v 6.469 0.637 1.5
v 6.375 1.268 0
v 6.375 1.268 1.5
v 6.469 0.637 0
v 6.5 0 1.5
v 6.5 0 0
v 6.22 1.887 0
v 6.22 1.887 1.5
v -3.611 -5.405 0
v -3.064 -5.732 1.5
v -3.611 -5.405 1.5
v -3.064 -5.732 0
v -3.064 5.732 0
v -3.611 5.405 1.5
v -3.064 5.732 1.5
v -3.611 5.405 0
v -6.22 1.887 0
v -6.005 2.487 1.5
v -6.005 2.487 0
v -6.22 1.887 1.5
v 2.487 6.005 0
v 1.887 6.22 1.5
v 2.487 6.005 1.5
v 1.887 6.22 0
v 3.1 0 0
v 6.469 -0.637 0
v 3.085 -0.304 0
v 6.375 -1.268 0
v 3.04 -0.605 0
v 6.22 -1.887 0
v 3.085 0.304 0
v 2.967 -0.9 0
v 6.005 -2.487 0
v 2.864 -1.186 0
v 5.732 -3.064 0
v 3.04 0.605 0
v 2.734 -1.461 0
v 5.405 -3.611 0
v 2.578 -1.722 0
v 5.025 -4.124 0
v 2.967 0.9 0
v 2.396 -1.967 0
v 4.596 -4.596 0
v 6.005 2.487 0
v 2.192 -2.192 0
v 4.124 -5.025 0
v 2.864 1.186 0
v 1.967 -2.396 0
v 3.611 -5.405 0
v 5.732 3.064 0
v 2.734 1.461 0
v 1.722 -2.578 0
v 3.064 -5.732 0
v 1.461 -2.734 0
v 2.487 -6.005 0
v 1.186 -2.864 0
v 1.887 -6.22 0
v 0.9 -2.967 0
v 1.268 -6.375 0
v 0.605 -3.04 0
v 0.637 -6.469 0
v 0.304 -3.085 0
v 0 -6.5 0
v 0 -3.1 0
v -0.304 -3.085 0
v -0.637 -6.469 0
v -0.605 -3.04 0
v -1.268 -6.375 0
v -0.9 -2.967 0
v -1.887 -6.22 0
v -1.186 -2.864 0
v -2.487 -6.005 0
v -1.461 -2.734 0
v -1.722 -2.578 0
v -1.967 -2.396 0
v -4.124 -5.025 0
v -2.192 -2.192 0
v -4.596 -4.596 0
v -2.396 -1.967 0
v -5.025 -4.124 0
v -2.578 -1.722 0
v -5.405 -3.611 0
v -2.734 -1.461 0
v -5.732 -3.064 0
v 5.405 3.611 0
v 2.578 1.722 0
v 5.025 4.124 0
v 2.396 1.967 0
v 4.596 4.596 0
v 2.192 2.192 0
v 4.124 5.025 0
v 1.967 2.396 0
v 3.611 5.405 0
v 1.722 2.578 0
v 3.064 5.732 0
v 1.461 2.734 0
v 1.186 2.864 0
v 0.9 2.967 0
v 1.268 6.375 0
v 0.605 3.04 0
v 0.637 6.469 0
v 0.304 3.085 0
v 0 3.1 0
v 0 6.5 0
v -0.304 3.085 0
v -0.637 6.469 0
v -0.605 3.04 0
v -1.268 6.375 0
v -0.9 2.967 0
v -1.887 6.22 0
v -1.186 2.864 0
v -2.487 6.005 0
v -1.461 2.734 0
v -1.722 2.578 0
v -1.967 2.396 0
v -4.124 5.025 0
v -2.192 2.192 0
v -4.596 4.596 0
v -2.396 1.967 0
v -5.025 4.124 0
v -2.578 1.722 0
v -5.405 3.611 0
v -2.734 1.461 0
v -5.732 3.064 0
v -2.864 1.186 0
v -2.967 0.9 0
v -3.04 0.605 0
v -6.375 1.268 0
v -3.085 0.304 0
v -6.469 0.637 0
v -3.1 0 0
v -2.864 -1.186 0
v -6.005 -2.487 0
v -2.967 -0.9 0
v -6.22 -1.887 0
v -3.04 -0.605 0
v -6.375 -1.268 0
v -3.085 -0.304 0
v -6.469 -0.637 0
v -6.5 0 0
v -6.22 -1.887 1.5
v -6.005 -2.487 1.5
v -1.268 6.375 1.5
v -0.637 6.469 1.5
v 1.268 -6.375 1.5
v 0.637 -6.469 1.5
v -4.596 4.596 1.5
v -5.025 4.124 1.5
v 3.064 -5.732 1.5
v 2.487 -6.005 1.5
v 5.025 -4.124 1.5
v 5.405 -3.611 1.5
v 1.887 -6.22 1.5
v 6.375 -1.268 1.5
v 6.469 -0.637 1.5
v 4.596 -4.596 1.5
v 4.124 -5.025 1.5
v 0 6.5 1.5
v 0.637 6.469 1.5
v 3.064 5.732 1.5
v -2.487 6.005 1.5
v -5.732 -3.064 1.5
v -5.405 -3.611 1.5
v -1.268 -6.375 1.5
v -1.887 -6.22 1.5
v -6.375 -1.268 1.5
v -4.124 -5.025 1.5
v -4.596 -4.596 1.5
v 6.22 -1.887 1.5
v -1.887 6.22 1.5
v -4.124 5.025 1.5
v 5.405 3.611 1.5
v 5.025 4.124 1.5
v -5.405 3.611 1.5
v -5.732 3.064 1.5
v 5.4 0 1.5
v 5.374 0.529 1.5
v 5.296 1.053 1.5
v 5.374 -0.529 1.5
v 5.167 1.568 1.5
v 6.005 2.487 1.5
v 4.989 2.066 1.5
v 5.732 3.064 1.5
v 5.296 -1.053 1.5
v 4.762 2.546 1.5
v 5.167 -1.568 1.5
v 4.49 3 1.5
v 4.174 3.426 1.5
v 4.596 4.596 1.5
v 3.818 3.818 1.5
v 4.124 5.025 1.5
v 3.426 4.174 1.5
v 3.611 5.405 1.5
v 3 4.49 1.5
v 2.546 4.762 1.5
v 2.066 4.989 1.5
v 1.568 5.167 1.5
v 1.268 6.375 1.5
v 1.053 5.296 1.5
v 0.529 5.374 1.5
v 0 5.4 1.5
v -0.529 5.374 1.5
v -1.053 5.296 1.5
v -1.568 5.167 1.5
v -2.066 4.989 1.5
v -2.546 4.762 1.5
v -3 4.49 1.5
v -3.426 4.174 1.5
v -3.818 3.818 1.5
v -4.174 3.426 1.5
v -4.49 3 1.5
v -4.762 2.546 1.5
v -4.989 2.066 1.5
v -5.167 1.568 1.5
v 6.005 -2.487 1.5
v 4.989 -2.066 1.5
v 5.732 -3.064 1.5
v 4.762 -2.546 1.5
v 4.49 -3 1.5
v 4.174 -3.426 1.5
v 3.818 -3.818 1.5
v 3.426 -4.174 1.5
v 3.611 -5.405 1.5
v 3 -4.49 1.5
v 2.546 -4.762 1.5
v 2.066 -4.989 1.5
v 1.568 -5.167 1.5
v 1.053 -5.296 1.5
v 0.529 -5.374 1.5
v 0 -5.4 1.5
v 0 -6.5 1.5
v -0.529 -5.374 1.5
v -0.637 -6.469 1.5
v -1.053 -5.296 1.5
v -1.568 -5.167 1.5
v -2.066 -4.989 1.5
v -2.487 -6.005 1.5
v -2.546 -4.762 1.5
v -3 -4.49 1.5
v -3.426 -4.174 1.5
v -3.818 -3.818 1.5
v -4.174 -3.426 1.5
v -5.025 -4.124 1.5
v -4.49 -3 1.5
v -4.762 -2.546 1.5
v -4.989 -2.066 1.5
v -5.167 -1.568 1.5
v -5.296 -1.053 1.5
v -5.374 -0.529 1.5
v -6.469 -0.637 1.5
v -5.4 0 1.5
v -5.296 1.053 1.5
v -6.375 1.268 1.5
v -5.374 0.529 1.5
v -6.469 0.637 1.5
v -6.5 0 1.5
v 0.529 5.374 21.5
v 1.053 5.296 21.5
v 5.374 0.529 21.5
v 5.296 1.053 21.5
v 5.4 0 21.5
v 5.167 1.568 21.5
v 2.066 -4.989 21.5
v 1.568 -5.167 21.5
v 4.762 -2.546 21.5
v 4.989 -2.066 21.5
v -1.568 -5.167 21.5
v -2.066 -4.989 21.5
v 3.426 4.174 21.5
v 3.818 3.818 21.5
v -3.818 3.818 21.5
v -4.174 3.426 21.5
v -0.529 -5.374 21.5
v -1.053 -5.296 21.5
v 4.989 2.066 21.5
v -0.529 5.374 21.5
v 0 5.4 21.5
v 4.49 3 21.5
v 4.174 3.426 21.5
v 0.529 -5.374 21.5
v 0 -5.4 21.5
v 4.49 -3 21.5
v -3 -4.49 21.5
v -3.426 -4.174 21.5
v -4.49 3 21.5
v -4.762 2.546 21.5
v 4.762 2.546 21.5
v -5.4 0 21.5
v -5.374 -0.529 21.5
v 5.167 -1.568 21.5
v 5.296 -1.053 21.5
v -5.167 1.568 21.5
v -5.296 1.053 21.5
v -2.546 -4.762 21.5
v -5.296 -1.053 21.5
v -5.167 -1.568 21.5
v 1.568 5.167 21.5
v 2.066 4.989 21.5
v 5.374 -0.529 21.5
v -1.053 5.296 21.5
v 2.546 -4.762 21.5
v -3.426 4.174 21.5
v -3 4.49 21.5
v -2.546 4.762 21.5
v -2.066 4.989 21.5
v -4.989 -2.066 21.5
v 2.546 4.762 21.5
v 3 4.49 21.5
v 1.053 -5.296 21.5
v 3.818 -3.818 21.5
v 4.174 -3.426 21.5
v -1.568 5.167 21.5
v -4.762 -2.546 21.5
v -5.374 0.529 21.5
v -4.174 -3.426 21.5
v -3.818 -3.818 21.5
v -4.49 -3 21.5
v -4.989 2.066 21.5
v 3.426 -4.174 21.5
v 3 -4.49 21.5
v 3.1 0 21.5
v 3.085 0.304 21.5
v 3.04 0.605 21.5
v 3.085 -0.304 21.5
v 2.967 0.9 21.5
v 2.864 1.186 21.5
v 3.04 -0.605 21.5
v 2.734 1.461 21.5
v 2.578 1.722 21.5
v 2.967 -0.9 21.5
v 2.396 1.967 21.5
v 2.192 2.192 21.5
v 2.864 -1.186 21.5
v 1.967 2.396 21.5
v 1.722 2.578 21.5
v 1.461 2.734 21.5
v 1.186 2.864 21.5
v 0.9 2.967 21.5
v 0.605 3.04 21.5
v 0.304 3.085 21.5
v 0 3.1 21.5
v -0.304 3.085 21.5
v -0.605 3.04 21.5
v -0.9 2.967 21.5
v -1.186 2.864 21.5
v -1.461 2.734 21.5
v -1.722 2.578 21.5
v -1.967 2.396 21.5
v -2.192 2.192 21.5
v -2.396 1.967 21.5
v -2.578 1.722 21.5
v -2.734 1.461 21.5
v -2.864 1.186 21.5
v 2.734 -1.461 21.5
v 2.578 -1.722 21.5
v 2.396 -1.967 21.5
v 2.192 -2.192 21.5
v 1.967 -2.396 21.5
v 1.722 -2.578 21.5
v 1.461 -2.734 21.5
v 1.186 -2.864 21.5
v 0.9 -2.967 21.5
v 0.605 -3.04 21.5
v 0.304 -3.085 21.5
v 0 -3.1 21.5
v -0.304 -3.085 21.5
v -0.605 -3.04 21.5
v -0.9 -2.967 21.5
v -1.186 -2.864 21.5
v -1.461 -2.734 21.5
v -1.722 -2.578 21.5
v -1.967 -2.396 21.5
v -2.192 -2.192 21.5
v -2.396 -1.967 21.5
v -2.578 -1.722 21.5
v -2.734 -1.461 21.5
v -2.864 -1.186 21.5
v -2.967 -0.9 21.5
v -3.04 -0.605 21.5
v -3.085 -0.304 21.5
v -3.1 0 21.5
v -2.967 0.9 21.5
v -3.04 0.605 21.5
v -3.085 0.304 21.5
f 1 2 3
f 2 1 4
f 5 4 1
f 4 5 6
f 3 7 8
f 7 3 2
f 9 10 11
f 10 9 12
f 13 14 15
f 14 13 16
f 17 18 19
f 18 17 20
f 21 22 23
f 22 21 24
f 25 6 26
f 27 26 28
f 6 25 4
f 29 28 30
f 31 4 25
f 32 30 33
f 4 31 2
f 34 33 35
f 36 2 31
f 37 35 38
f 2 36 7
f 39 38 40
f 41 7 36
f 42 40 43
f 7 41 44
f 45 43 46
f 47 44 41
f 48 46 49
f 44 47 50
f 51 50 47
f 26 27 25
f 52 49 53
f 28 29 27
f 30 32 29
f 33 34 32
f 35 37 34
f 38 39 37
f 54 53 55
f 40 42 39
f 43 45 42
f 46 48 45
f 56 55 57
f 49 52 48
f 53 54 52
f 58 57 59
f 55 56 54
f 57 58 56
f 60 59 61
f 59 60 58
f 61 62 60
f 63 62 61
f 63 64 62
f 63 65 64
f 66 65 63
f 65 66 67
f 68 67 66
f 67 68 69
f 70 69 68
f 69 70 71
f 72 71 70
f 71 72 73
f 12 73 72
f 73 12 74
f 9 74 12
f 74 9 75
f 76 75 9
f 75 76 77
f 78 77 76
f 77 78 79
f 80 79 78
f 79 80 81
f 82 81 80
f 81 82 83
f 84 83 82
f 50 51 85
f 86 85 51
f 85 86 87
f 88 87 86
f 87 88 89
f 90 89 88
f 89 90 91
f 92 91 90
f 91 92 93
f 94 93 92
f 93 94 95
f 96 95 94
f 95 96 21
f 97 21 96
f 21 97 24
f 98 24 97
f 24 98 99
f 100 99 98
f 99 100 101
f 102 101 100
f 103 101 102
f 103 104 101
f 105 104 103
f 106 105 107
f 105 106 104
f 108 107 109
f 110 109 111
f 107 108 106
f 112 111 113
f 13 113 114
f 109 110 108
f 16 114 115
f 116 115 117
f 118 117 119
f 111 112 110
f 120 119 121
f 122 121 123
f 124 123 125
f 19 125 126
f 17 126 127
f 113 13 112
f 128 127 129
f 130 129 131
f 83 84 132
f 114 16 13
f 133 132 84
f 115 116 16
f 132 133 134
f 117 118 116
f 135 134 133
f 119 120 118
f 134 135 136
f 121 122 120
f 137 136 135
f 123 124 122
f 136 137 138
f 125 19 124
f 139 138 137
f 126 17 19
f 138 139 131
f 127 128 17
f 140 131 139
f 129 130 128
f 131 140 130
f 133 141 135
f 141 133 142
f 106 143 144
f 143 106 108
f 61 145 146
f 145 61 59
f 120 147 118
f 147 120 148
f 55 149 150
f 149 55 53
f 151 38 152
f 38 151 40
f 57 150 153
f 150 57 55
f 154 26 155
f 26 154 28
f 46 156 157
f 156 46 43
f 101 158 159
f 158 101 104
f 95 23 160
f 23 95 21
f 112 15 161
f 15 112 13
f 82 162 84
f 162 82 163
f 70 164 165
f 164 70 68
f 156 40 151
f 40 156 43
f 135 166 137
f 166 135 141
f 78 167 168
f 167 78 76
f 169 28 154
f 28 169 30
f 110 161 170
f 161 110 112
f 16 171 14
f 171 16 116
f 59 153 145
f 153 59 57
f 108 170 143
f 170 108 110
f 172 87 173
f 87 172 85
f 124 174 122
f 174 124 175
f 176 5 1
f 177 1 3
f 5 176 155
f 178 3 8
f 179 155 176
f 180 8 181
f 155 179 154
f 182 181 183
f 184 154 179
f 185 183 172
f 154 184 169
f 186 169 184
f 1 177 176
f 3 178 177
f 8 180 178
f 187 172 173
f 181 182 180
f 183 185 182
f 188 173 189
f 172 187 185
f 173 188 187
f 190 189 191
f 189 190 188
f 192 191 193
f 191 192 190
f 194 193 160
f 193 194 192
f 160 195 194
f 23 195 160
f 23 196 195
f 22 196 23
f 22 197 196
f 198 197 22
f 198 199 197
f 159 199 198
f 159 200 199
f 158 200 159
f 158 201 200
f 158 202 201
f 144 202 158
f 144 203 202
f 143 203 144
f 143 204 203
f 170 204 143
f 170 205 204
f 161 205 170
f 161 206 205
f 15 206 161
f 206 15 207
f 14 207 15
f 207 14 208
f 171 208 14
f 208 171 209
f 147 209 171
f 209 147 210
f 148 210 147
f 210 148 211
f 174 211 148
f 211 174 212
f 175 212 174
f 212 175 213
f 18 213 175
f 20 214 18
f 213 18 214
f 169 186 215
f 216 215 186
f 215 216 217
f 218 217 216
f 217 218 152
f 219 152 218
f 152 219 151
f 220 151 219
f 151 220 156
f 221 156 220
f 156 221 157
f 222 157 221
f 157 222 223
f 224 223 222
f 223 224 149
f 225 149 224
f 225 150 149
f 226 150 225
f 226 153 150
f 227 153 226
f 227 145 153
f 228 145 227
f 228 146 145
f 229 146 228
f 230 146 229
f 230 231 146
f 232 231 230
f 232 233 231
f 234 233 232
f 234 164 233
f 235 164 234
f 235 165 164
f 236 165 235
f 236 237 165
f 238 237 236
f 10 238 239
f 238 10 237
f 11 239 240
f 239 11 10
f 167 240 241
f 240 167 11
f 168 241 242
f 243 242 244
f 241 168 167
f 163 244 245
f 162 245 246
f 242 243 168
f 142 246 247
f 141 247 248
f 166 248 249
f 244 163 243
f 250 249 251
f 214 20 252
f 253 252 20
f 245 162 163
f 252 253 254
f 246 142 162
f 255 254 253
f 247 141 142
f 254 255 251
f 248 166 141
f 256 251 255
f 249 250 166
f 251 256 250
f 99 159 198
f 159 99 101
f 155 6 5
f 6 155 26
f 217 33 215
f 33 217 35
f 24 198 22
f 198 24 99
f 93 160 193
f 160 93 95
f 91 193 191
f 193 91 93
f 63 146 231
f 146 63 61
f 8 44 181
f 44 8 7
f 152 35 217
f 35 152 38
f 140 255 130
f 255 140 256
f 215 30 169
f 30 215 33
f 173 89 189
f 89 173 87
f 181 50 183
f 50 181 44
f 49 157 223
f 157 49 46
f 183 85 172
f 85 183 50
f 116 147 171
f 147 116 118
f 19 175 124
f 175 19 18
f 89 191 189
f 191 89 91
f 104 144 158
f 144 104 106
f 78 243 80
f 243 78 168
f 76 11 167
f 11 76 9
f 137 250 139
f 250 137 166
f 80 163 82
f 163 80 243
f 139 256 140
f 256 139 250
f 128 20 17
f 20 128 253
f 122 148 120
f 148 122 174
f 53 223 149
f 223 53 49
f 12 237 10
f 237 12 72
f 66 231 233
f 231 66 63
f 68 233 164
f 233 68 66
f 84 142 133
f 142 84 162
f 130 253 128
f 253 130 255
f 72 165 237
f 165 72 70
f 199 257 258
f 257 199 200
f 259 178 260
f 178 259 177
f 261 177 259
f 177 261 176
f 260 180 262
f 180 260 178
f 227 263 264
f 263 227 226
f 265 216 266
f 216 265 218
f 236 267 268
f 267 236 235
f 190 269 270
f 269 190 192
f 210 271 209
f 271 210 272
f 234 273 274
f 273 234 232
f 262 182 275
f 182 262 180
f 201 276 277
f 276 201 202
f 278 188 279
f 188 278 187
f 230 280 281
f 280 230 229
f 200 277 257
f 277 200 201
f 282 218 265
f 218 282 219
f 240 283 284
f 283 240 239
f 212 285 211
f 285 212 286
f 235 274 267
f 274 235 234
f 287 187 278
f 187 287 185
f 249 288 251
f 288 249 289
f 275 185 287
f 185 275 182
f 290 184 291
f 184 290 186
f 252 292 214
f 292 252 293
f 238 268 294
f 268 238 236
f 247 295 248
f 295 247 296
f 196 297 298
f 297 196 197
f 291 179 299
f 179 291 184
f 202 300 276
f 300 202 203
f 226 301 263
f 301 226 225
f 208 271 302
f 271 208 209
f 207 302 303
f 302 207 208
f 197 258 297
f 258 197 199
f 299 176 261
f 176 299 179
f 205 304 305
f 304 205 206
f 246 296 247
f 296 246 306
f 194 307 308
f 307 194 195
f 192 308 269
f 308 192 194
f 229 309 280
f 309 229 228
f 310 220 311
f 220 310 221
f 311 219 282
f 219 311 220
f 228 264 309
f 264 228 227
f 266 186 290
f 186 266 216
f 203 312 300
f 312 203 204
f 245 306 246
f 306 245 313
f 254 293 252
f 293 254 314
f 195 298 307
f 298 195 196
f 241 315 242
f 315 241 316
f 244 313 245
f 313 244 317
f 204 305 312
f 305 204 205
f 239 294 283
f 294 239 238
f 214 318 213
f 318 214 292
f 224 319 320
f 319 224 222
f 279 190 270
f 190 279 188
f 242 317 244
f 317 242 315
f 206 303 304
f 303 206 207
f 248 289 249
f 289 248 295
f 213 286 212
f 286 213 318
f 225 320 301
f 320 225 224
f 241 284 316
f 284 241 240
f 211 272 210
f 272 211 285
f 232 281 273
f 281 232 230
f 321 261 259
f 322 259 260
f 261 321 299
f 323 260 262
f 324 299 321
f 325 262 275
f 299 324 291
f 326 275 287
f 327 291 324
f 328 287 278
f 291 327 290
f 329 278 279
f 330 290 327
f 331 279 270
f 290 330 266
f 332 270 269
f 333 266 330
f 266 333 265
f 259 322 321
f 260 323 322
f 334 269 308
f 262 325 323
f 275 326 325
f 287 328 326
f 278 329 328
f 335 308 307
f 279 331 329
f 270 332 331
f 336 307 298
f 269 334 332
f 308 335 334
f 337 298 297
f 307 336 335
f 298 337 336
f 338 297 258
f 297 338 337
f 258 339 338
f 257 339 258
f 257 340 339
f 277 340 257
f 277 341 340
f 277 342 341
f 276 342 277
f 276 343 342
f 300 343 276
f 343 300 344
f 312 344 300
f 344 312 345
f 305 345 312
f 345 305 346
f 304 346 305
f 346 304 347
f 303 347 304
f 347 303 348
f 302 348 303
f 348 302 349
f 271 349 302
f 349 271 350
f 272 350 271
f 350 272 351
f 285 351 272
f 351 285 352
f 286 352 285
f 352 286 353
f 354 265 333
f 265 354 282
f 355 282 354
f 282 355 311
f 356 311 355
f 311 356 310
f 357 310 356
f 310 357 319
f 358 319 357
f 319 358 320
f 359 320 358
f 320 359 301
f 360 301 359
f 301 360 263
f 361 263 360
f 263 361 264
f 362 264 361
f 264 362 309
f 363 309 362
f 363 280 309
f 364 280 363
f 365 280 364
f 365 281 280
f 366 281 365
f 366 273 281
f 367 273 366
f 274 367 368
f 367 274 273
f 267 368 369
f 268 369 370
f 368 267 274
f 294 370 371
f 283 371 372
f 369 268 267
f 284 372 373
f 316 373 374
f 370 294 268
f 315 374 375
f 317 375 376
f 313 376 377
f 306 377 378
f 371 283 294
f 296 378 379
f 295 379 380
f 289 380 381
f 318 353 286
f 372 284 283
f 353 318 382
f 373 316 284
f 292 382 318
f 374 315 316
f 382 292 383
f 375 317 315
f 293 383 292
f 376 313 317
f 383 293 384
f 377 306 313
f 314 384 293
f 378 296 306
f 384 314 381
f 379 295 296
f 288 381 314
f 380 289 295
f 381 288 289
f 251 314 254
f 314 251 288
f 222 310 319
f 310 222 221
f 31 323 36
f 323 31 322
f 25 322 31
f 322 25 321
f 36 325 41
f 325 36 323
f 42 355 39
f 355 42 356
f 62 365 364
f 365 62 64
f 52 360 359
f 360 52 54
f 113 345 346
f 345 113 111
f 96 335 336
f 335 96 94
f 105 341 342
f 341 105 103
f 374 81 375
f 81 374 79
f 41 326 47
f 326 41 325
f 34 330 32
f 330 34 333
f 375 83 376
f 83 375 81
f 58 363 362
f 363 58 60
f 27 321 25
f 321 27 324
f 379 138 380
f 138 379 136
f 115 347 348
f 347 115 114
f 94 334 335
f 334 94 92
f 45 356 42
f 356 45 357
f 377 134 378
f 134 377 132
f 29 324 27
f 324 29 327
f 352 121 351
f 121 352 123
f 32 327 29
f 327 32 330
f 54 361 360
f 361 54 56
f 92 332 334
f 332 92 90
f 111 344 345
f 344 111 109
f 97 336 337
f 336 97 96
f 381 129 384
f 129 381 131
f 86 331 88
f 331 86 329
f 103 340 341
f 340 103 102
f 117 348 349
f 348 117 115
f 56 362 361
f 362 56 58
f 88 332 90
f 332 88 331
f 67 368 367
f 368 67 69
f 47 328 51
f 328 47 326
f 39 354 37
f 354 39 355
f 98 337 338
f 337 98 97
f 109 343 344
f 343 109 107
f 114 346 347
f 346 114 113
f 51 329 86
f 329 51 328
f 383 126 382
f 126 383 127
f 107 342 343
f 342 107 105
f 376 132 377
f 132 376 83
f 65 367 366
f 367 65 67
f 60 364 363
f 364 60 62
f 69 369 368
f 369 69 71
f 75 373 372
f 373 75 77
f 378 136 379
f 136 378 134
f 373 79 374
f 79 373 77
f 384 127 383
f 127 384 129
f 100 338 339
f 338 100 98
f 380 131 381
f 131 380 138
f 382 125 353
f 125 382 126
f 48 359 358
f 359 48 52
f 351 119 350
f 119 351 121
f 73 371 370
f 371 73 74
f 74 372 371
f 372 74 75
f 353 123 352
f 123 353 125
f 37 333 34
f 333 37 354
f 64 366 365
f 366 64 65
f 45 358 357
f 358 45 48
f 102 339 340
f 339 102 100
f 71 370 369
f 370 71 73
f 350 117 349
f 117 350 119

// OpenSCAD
// Adapter sleeve: 0.2 mL PCR tube into a 1.5 mL rack hole
// Print orientation: collar (13 mm dia, 1.5 mm thick) on the bed (z = 0..1.5),
// sleeve body (10.8 mm OD) rising to z = 21.5, with a 6.2 mm bore through the full height.

$fn = 64;

// --- Dimensions (mm) ---
collar_dia   = 13.0;   // collar outer diameter
collar_thk   = 1.5;    // collar thickness (z = 0 to 1.5)
sleeve_od    = 10.8;   // sleeve body outer diameter
sleeve_top   = 21.5;   // top of sleeve body (z)
bore_dia     = 6.2;    // straight bore diameter, open at both ends

// --- Derived radii ---
collar_r = collar_dia / 2;   // 6.5
sleeve_r = sleeve_od  / 2;   // 5.4
bore_r   = bore_dia   / 2;   // 3.1

// --- Build the solid, centred on the origin in X and Y, resting on z = 0 ---
difference() {
    union() {
        // Collar: 13 mm dia, 1.5 mm thick, sitting on the bed
        cylinder(h = collar_thk, d = collar_dia, $fn = $fn);

        // Sleeve body: 10.8 mm OD, from the top of the collar up to z = 21.5
        translate([0, 0, collar_thk])
            cylinder(h = sleeve_top - collar_thk, d = sleeve_od, $fn = $fn);
    }

    // Bore: 6.2 mm dia, through the full height, open at both ends.
    // Extended 1 mm past each face so no faces are exactly coplanar.
    translate([0, 0, -1])
        cylinder(h = sleeve_top + 2, d = bore_dia, $fn = $fn);
}
